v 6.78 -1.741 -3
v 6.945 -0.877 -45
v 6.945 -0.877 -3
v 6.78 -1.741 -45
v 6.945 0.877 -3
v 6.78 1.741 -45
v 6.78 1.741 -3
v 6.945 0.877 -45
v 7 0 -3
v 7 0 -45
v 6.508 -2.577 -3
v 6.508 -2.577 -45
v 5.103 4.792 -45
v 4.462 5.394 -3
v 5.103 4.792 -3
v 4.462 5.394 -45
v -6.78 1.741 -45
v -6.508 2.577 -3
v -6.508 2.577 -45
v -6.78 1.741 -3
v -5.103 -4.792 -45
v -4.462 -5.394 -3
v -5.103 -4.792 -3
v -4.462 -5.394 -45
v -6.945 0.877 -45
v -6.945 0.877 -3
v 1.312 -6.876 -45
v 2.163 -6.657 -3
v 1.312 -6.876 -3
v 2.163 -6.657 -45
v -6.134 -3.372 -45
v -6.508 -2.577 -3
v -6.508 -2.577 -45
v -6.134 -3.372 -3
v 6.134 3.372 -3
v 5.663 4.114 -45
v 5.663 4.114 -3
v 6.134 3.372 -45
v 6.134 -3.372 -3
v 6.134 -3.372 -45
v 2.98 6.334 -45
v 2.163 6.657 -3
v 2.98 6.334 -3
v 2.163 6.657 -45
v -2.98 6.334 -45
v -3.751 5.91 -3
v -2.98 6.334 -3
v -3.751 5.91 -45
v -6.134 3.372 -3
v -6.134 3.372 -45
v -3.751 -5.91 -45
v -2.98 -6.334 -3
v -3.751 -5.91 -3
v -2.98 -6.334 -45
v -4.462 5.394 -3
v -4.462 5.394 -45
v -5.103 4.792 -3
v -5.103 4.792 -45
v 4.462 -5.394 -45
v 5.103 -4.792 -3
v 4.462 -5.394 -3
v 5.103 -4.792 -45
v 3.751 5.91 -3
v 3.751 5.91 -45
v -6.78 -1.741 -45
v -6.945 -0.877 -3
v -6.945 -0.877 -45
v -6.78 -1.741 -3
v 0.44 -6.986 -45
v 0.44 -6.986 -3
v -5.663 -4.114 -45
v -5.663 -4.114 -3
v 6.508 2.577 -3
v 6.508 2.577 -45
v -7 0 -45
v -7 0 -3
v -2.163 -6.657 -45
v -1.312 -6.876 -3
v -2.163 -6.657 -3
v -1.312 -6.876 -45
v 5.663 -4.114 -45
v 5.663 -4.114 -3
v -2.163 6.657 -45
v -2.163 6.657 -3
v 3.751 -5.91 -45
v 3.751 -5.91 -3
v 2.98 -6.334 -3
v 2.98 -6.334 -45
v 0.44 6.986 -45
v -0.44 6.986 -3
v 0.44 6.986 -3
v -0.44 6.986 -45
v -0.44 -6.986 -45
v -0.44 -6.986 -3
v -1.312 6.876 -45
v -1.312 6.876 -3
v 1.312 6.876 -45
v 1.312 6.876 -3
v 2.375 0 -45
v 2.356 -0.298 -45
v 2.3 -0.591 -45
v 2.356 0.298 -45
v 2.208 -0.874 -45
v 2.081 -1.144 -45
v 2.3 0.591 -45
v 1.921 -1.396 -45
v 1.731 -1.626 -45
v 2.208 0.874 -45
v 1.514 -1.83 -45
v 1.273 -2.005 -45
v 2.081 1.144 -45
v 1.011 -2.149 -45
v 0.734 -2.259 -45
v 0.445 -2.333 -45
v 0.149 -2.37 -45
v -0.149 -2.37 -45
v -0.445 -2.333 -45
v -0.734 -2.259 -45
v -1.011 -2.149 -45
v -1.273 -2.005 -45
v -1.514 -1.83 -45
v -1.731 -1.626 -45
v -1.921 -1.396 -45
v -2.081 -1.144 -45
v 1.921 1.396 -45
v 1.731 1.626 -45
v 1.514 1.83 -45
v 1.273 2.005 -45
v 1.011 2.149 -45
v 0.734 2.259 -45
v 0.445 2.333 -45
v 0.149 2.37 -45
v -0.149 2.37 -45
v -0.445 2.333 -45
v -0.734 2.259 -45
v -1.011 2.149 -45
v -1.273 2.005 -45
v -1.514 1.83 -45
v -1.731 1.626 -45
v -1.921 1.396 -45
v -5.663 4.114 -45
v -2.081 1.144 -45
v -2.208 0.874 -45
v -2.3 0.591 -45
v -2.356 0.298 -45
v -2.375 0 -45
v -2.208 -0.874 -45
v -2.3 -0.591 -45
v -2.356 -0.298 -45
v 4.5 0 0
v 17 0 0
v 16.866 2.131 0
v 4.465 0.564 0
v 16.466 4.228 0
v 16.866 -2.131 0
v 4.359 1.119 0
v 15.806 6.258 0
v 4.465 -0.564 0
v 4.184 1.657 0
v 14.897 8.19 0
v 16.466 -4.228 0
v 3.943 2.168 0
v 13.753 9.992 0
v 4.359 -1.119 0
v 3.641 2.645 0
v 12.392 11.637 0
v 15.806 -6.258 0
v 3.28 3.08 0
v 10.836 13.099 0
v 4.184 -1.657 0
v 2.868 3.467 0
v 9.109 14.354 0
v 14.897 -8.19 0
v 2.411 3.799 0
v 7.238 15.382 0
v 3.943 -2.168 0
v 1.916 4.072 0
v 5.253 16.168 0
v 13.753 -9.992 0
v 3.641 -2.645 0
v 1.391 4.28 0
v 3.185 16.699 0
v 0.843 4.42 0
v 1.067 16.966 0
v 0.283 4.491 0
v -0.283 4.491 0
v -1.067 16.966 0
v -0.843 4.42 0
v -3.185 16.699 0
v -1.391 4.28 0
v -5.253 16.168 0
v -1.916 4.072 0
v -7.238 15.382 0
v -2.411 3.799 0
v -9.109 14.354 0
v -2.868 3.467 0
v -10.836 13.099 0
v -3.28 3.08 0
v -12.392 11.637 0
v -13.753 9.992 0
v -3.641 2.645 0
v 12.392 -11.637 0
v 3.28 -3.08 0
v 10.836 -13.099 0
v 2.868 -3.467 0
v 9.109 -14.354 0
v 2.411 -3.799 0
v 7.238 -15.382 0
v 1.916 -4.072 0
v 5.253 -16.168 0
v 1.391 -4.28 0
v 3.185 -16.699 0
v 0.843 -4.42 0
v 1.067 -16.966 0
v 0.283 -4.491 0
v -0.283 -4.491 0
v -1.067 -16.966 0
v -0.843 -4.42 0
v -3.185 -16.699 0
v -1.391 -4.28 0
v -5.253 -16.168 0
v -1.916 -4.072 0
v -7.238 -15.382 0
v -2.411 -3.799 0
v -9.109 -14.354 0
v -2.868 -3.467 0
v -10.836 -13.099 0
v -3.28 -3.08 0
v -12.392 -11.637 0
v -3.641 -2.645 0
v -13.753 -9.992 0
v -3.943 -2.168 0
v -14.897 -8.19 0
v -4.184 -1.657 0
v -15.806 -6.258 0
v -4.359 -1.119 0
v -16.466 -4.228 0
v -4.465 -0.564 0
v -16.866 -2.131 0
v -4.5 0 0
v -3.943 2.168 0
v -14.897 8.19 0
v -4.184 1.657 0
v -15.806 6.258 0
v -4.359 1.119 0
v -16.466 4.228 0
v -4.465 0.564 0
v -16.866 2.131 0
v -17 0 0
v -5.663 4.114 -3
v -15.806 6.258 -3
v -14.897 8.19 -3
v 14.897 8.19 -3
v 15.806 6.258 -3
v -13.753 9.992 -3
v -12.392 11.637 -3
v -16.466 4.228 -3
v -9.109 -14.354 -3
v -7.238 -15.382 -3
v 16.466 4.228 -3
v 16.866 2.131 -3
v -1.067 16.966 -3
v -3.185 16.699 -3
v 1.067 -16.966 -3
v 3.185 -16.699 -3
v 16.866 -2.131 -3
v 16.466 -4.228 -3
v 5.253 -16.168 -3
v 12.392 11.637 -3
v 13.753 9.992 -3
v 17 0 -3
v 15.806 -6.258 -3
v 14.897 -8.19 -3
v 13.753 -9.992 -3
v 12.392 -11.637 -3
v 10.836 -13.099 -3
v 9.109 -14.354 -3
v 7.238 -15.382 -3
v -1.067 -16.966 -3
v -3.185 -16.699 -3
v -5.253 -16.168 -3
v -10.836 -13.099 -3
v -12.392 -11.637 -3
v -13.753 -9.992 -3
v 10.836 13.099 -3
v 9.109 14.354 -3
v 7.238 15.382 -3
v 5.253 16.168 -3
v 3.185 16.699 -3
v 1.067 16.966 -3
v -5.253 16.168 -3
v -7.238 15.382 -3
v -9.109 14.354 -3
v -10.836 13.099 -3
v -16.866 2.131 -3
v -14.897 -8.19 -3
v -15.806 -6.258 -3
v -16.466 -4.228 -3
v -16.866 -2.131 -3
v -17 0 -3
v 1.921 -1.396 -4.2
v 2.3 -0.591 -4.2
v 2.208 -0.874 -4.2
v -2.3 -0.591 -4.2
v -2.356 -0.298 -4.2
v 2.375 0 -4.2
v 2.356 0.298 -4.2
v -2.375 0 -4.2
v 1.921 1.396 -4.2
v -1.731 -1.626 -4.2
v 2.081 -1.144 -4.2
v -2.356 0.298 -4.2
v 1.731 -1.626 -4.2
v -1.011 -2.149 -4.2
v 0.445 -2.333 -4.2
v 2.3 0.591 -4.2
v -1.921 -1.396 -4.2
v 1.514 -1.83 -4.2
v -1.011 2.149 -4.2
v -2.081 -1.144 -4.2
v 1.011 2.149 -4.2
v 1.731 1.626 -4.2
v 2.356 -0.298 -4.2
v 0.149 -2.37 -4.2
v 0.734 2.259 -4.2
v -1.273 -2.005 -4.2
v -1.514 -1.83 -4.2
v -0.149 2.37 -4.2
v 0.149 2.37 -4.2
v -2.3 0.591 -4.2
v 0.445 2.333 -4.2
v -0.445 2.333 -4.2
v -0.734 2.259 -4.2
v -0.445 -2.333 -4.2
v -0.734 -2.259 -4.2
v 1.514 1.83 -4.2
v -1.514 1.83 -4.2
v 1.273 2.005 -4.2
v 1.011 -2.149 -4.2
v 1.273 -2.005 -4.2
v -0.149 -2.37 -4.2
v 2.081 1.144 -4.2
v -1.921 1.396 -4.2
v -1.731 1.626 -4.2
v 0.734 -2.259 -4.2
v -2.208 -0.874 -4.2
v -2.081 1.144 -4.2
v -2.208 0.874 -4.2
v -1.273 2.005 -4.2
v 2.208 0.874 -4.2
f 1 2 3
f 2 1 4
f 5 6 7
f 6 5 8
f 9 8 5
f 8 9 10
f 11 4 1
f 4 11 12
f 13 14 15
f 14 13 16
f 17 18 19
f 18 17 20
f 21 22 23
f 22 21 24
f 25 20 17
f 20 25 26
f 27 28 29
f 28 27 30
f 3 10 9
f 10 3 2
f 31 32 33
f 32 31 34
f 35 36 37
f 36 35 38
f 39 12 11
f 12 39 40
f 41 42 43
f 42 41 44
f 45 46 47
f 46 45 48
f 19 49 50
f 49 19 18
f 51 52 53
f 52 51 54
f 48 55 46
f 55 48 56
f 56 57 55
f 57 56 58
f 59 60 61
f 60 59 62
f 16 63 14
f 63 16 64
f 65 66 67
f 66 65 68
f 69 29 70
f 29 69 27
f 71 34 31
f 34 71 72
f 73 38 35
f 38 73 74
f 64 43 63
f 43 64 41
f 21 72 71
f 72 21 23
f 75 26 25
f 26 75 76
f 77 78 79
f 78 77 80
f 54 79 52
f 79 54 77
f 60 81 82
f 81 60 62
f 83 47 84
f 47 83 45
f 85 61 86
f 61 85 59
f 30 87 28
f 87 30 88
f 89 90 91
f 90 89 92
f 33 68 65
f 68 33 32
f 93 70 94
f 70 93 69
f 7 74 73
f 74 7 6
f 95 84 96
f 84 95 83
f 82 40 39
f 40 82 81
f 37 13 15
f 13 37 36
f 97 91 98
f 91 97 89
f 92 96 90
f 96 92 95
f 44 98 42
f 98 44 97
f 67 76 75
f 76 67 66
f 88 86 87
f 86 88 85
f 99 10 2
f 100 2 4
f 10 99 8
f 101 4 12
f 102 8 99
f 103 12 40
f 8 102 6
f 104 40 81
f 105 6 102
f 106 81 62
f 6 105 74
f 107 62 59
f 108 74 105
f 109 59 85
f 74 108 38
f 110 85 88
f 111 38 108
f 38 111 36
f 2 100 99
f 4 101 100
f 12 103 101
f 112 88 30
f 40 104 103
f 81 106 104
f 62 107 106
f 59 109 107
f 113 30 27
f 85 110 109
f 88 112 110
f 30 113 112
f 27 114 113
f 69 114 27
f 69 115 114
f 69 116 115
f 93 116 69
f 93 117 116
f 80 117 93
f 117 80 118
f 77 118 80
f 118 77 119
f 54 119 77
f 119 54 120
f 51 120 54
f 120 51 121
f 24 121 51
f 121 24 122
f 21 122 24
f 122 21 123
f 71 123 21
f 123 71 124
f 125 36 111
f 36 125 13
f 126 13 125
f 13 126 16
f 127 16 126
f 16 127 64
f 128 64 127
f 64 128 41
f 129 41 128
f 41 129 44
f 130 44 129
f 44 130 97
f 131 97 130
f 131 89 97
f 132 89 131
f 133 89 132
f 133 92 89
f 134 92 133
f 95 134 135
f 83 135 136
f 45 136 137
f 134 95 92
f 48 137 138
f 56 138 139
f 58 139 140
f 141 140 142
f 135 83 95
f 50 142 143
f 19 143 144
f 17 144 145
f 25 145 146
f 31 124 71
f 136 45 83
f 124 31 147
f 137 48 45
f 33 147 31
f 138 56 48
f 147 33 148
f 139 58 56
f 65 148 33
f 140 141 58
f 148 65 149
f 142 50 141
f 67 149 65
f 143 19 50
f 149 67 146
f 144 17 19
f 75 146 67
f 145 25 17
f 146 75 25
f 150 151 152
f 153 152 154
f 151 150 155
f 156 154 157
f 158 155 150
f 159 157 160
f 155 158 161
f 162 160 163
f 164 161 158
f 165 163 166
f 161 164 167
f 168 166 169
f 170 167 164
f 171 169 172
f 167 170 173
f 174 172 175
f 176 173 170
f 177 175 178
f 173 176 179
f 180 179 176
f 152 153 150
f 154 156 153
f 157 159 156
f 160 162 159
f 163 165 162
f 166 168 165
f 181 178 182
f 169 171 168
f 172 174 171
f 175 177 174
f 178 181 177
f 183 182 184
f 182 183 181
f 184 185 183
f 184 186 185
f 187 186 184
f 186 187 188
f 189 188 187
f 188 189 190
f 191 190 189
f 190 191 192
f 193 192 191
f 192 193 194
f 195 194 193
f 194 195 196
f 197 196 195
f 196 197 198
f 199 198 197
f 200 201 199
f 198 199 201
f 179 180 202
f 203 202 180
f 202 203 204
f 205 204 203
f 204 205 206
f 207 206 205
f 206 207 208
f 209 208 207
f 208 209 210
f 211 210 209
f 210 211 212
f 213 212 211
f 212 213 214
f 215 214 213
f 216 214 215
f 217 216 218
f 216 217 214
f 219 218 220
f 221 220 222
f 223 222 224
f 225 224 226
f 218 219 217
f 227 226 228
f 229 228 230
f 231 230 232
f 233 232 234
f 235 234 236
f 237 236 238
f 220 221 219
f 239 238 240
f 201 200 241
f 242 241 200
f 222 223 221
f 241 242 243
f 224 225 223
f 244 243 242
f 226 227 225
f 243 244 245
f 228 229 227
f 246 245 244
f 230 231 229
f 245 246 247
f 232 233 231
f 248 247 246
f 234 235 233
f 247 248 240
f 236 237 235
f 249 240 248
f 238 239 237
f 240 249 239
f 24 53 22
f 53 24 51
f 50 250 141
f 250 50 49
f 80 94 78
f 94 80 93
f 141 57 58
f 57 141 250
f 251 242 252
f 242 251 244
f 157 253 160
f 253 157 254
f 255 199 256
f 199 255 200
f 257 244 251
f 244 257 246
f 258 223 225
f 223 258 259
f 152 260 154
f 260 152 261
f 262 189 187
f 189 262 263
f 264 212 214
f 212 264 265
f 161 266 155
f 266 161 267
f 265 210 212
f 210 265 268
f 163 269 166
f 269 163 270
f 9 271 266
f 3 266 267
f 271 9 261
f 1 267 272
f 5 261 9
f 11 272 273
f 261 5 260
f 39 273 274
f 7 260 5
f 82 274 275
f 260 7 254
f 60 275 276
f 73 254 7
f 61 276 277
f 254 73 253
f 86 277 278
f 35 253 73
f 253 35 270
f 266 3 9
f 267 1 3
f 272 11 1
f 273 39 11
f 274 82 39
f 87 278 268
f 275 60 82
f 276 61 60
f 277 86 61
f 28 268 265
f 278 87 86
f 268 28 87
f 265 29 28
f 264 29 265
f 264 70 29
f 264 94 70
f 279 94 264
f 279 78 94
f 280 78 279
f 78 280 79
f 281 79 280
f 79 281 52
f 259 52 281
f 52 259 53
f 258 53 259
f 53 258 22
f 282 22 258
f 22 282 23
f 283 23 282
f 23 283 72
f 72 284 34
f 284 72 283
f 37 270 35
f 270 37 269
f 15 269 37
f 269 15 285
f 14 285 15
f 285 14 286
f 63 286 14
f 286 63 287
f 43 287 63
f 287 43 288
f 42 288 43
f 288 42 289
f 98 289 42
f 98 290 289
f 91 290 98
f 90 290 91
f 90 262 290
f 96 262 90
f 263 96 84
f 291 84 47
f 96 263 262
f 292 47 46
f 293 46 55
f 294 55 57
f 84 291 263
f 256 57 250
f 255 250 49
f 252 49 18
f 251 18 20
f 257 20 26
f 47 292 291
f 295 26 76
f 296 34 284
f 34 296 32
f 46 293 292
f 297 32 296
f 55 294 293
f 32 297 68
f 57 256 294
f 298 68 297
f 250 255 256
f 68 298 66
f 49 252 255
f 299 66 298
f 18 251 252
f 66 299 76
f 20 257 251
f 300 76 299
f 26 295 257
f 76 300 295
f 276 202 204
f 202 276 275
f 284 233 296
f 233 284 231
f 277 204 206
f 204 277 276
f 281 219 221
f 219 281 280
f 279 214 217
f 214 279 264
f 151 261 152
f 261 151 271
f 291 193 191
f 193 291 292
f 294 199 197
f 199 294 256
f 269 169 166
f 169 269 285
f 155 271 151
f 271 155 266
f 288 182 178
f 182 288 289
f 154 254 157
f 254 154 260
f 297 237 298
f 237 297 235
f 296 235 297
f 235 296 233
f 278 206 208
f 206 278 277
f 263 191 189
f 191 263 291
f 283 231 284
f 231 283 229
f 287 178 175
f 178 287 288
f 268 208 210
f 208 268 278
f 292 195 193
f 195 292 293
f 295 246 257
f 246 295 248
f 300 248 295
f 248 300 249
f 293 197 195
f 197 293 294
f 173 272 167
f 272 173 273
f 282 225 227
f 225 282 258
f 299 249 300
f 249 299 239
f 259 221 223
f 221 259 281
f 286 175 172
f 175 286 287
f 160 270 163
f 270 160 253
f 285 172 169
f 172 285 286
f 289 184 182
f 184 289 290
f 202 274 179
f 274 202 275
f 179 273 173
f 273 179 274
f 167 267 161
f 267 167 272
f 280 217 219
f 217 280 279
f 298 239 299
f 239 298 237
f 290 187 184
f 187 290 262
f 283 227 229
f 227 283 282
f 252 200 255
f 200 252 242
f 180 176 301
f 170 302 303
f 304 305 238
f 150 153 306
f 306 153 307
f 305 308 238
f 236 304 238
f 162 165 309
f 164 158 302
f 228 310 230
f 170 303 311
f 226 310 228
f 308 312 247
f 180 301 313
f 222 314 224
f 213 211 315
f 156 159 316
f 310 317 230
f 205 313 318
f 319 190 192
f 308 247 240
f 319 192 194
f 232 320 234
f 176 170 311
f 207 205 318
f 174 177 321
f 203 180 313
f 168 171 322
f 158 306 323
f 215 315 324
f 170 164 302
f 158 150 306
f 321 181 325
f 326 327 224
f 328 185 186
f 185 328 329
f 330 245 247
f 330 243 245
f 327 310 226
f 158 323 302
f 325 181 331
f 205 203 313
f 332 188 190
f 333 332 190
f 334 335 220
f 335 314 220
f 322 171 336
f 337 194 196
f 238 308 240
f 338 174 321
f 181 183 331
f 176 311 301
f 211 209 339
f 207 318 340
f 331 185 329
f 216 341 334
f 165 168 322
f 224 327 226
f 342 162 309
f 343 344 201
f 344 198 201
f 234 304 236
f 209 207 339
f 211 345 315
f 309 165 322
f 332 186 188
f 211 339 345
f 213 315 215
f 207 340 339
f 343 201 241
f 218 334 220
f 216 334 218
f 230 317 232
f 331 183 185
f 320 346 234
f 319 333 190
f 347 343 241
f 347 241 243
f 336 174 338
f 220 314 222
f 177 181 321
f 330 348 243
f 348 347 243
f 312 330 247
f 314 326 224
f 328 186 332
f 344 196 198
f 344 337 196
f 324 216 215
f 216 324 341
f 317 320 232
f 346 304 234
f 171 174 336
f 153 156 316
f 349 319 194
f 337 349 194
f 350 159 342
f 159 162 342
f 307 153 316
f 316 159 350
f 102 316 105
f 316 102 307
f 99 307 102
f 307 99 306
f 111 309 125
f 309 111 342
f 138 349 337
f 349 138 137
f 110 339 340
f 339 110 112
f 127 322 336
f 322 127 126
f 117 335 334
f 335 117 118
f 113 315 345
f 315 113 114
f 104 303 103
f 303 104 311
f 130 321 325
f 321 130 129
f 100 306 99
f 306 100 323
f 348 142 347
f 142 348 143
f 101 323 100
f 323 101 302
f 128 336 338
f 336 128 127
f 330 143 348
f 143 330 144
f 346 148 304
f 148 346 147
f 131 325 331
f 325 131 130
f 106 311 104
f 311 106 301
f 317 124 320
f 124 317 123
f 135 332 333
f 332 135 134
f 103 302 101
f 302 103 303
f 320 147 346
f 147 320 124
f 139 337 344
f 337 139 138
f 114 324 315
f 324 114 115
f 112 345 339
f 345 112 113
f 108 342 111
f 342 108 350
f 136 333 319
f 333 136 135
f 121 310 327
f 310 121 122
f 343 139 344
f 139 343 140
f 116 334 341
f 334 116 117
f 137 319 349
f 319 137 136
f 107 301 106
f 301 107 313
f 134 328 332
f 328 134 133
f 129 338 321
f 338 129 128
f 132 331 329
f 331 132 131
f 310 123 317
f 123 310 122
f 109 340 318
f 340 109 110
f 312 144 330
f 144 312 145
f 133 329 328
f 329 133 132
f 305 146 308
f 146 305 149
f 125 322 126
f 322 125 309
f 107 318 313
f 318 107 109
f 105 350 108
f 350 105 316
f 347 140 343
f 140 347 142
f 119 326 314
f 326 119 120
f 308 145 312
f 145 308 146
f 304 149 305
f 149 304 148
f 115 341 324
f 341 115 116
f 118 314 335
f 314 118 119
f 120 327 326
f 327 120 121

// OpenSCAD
$fn = 50;


difference() {
	union() {
		translate(v = [0, 0, -45.0000000000]) {
			cylinder(h = 45, r = 7.0000000000);
		}
		translate(v = [0, 0, -3.0000000000]) {
			cylinder(h = 3, r = 17.0000000000);
		}
	}
	union() {
		translate(v = [0, 0, 0]) {
			rotate(a = [0, 0, 0]) {
				difference() {
					union() {
						#translate(v = [0, 0, -45.0000000000]) {
							cylinder(h = 45, r = 2.2500000000);
						}
						#translate(v = [0, 0, -4.2000000000]) {
							cylinder(h = 4.2000000000, r = 7.0000000000, r1 = 2.3750000000, r2 = 4.5000000000);
						}
						#translate(v = [0, 0, -45.0000000000]) {
							cylinder(h = 45, r = 2.3750000000);
						}
						#translate(v = [0, 0, -45.0000000000]) {
							cylinder(h = 45, r = 2.2500000000);
						}
					}
					union();
				}
			}
		}
	}
}
